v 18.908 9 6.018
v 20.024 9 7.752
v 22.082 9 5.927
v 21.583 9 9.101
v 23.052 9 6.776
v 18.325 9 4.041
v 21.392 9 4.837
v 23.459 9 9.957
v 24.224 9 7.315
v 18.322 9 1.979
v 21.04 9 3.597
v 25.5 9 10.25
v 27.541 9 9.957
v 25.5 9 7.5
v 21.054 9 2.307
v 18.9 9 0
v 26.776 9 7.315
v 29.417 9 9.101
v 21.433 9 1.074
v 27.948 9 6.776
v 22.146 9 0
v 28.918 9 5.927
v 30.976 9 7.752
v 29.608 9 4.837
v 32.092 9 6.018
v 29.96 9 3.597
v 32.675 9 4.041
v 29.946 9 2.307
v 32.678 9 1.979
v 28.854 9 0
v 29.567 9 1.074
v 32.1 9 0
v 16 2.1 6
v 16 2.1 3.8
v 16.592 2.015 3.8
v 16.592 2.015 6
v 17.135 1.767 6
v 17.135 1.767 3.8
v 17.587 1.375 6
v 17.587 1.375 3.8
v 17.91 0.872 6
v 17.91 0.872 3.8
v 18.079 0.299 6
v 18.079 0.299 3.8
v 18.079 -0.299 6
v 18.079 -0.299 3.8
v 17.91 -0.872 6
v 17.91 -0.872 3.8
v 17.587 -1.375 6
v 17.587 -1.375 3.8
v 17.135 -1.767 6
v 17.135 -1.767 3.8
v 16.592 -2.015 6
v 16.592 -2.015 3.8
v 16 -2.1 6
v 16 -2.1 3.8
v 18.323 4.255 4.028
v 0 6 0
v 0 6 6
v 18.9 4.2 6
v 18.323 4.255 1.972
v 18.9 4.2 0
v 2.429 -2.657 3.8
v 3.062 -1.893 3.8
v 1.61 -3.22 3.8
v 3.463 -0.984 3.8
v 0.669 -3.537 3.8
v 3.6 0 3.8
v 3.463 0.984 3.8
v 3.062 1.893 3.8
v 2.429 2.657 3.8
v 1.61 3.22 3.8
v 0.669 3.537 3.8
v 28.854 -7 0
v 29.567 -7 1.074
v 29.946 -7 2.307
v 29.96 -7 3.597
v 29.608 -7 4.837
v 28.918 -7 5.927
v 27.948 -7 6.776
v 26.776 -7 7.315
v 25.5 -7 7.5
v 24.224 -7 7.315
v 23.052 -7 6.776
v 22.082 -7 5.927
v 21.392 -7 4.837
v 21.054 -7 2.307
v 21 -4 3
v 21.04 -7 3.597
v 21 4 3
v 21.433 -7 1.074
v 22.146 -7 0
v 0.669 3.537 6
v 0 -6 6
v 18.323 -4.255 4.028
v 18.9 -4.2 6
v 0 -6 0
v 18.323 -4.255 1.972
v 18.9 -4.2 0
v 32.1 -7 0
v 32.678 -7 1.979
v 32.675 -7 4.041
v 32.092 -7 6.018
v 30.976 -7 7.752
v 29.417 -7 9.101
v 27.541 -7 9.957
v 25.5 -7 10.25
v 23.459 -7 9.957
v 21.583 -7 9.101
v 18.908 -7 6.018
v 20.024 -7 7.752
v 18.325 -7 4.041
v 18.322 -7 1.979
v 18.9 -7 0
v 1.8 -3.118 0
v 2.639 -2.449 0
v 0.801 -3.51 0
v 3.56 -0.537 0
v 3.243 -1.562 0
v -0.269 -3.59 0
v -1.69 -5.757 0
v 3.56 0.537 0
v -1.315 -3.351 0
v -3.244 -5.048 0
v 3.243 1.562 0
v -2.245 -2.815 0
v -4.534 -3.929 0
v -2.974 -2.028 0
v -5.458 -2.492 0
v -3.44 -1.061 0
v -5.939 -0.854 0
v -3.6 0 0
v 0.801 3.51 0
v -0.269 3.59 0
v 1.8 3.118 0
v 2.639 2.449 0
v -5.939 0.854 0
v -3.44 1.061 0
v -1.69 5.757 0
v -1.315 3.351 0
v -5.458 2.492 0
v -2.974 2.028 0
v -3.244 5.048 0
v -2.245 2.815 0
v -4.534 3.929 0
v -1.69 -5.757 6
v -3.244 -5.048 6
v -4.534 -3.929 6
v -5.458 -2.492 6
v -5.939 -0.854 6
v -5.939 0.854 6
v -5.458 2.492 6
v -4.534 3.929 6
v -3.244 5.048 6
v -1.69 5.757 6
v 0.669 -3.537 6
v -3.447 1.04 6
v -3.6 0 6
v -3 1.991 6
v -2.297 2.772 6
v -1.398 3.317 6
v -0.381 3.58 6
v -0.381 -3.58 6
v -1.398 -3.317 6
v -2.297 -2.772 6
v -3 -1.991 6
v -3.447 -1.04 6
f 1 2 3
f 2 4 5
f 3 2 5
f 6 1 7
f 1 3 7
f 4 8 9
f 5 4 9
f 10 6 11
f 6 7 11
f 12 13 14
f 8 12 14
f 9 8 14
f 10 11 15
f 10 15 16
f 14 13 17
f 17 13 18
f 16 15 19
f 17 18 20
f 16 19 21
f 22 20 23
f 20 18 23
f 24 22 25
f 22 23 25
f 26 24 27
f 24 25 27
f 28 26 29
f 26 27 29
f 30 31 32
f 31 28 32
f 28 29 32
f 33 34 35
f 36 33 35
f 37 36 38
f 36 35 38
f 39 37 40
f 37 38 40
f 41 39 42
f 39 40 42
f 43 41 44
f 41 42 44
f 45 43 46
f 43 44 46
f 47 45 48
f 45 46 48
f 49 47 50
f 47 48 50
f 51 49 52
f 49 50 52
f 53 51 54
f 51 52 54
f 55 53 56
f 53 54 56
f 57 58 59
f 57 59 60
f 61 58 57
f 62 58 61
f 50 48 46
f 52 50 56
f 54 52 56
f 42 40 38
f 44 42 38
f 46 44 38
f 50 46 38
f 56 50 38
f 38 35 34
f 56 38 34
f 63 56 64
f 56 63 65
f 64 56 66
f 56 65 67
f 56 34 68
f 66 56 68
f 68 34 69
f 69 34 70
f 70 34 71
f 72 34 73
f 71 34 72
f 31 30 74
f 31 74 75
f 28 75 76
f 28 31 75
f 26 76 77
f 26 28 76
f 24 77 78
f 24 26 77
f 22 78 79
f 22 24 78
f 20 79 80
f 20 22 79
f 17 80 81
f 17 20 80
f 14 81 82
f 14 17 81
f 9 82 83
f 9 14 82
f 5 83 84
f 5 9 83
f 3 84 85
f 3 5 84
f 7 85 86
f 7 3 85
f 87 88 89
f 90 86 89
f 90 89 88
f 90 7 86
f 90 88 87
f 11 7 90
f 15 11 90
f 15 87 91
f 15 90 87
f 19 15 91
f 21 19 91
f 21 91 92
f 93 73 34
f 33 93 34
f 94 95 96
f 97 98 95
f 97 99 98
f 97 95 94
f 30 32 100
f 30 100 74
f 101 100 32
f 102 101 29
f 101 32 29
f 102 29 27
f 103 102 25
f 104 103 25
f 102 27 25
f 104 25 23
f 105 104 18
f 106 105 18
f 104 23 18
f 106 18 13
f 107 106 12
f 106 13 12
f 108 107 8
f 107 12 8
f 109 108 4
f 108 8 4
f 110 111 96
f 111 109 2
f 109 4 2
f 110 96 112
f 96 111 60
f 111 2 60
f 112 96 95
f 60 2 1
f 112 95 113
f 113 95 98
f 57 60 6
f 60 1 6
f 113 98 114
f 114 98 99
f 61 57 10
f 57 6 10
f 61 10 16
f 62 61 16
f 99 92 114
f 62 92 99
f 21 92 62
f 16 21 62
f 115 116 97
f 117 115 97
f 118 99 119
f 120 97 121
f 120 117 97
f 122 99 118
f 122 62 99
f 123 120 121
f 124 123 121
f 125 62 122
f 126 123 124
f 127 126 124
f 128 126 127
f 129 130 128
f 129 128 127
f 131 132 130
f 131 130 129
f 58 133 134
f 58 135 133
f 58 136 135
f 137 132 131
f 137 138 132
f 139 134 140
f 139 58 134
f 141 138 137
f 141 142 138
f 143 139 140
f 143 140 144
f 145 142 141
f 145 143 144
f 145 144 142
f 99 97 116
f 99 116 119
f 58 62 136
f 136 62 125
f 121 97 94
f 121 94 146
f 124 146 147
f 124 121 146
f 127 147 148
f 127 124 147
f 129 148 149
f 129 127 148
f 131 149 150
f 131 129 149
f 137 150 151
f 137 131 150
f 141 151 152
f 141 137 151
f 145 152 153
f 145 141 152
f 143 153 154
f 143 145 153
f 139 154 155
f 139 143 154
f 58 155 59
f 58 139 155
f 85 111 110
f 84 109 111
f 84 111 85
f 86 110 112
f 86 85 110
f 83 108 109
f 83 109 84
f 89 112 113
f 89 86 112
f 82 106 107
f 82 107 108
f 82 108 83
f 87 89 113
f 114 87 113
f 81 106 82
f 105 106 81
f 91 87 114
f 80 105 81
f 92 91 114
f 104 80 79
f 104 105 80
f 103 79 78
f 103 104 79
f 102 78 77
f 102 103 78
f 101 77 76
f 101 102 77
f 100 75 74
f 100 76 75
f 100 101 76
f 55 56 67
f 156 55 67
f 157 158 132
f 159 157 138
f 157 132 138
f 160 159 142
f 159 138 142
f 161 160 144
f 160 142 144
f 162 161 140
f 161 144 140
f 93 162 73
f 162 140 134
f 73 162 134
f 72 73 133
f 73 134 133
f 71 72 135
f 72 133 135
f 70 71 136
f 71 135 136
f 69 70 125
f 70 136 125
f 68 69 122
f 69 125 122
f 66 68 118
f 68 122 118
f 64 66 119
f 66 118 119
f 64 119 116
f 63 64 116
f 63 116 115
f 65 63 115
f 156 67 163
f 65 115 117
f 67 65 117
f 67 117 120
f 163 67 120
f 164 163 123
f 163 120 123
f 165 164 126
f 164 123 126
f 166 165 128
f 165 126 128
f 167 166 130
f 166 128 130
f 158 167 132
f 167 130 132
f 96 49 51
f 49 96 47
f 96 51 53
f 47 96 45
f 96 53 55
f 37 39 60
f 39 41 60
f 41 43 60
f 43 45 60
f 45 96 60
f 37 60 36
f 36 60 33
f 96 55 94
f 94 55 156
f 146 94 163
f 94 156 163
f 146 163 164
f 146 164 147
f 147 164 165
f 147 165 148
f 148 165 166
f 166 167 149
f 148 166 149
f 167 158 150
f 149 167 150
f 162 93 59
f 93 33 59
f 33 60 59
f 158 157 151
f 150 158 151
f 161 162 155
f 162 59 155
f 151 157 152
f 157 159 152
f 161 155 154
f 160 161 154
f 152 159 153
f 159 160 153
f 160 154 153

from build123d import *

# Parameters (mm, degrees)
BOSS_EXTRU_1_DEPTH      = 6
ENL_V_MAT_EXTRU_1_REACH = 24.65
ESQUISSE2_R             = 3.6
ENL_V_START             = -2.2
ENL_V_MAT_EXTRU_2_DEPTH = 2.2
ESQUISSE6_W             = 2.75
ESQUISSE6_H             = 16
ENL_V_MAT_EXTRU_4_REACH = 37.477
ESQUISSE7_W             = 29.554917854
ESQUISSE7_H             = 36.646442603


with BuildPart() as part:
    # Esquisse1 → Boss.-Extru.1 (new body)
    with BuildSketch(Plane.XY):
        with BuildLine():
            Line((0, 6), (21, 4))
            Line((21, 4), (21, -4))
            Line((21, -4), (0, -6))
            ThreePointArc((0, -6), (-6, 0), (0, 6))
        make_face()
    extrude(amount=BOSS_EXTRU_1_DEPTH)

    # Esquisse2 → Enlèv. mat.-Extru.1 (cut, up to next)
    with BuildSketch(Plane(origin=(0, 0, 0), x_dir=(-1, 0, 0), z_dir=(0, 0, -1)), mode=Mode.PRIVATE) as enl_v_mat_extru_1_sk1:
        Circle(ESQUISSE2_R)
    enl_v_mat_extru_1_tool1 = extrude(enl_v_mat_extru_1_sk1.sketch, amount=-ENL_V_MAT_EXTRU_1_REACH, mode=Mode.PRIVATE) & part.part
    add(enl_v_mat_extru_1_tool1.solids().sort_by_distance((0, 0, 0))[0], mode=Mode.SUBTRACT)

    # Esquisse3 → Enlèv. mat.-Extru.2 (cut)
    with BuildSketch(Plane.XY.offset(6).offset(ENL_V_START)):
        with BuildLine():
            Line((0, 3.6), (16, 2.1))
            ThreePointArc((16, 2.1), (18.1, 0), (16, -2.1))
            Line((16, -2.1), (0, -3.6))
            ThreePointArc((0, -3.6), (-3.6, 0), (0, 3.6))
        make_face()
    extrude(amount=ENL_V_MAT_EXTRU_2_DEPTH, mode=Mode.SUBTRACT)

    # Esquisse6 → Révolution1 (revolve)
    with BuildSketch(Plane.XY.offset(3)):
        with Locations((19.625, 1)):
            Rectangle(ESQUISSE6_W, ESQUISSE6_H)
    revolve(axis=Axis((25.5, 9, 3), (0, -1, 0)))

    # Esquisse7 → Enlèv. mat.-Extru.4 (cut, up to next)
    with BuildSketch(Plane(origin=(0, 0, 0), x_dir=(-1, 0, 0), z_dir=(0, 0, -1)), mode=Mode.PRIVATE) as enl_v_mat_extru_4_sk1:
        with Locations((-30.387795564, 1.156001867)):
            Rectangle(ESQUISSE7_W, ESQUISSE7_H)
    enl_v_mat_extru_4_tool1 = extrude(enl_v_mat_extru_4_sk1.sketch, amount=ENL_V_MAT_EXTRU_4_REACH, mode=Mode.PRIVATE) & part.part
    add(enl_v_mat_extru_4_tool1.solids().sort_by_distance((30.387796, 1.156002, 0))[0], mode=Mode.SUBTRACT)


solid = part.part
